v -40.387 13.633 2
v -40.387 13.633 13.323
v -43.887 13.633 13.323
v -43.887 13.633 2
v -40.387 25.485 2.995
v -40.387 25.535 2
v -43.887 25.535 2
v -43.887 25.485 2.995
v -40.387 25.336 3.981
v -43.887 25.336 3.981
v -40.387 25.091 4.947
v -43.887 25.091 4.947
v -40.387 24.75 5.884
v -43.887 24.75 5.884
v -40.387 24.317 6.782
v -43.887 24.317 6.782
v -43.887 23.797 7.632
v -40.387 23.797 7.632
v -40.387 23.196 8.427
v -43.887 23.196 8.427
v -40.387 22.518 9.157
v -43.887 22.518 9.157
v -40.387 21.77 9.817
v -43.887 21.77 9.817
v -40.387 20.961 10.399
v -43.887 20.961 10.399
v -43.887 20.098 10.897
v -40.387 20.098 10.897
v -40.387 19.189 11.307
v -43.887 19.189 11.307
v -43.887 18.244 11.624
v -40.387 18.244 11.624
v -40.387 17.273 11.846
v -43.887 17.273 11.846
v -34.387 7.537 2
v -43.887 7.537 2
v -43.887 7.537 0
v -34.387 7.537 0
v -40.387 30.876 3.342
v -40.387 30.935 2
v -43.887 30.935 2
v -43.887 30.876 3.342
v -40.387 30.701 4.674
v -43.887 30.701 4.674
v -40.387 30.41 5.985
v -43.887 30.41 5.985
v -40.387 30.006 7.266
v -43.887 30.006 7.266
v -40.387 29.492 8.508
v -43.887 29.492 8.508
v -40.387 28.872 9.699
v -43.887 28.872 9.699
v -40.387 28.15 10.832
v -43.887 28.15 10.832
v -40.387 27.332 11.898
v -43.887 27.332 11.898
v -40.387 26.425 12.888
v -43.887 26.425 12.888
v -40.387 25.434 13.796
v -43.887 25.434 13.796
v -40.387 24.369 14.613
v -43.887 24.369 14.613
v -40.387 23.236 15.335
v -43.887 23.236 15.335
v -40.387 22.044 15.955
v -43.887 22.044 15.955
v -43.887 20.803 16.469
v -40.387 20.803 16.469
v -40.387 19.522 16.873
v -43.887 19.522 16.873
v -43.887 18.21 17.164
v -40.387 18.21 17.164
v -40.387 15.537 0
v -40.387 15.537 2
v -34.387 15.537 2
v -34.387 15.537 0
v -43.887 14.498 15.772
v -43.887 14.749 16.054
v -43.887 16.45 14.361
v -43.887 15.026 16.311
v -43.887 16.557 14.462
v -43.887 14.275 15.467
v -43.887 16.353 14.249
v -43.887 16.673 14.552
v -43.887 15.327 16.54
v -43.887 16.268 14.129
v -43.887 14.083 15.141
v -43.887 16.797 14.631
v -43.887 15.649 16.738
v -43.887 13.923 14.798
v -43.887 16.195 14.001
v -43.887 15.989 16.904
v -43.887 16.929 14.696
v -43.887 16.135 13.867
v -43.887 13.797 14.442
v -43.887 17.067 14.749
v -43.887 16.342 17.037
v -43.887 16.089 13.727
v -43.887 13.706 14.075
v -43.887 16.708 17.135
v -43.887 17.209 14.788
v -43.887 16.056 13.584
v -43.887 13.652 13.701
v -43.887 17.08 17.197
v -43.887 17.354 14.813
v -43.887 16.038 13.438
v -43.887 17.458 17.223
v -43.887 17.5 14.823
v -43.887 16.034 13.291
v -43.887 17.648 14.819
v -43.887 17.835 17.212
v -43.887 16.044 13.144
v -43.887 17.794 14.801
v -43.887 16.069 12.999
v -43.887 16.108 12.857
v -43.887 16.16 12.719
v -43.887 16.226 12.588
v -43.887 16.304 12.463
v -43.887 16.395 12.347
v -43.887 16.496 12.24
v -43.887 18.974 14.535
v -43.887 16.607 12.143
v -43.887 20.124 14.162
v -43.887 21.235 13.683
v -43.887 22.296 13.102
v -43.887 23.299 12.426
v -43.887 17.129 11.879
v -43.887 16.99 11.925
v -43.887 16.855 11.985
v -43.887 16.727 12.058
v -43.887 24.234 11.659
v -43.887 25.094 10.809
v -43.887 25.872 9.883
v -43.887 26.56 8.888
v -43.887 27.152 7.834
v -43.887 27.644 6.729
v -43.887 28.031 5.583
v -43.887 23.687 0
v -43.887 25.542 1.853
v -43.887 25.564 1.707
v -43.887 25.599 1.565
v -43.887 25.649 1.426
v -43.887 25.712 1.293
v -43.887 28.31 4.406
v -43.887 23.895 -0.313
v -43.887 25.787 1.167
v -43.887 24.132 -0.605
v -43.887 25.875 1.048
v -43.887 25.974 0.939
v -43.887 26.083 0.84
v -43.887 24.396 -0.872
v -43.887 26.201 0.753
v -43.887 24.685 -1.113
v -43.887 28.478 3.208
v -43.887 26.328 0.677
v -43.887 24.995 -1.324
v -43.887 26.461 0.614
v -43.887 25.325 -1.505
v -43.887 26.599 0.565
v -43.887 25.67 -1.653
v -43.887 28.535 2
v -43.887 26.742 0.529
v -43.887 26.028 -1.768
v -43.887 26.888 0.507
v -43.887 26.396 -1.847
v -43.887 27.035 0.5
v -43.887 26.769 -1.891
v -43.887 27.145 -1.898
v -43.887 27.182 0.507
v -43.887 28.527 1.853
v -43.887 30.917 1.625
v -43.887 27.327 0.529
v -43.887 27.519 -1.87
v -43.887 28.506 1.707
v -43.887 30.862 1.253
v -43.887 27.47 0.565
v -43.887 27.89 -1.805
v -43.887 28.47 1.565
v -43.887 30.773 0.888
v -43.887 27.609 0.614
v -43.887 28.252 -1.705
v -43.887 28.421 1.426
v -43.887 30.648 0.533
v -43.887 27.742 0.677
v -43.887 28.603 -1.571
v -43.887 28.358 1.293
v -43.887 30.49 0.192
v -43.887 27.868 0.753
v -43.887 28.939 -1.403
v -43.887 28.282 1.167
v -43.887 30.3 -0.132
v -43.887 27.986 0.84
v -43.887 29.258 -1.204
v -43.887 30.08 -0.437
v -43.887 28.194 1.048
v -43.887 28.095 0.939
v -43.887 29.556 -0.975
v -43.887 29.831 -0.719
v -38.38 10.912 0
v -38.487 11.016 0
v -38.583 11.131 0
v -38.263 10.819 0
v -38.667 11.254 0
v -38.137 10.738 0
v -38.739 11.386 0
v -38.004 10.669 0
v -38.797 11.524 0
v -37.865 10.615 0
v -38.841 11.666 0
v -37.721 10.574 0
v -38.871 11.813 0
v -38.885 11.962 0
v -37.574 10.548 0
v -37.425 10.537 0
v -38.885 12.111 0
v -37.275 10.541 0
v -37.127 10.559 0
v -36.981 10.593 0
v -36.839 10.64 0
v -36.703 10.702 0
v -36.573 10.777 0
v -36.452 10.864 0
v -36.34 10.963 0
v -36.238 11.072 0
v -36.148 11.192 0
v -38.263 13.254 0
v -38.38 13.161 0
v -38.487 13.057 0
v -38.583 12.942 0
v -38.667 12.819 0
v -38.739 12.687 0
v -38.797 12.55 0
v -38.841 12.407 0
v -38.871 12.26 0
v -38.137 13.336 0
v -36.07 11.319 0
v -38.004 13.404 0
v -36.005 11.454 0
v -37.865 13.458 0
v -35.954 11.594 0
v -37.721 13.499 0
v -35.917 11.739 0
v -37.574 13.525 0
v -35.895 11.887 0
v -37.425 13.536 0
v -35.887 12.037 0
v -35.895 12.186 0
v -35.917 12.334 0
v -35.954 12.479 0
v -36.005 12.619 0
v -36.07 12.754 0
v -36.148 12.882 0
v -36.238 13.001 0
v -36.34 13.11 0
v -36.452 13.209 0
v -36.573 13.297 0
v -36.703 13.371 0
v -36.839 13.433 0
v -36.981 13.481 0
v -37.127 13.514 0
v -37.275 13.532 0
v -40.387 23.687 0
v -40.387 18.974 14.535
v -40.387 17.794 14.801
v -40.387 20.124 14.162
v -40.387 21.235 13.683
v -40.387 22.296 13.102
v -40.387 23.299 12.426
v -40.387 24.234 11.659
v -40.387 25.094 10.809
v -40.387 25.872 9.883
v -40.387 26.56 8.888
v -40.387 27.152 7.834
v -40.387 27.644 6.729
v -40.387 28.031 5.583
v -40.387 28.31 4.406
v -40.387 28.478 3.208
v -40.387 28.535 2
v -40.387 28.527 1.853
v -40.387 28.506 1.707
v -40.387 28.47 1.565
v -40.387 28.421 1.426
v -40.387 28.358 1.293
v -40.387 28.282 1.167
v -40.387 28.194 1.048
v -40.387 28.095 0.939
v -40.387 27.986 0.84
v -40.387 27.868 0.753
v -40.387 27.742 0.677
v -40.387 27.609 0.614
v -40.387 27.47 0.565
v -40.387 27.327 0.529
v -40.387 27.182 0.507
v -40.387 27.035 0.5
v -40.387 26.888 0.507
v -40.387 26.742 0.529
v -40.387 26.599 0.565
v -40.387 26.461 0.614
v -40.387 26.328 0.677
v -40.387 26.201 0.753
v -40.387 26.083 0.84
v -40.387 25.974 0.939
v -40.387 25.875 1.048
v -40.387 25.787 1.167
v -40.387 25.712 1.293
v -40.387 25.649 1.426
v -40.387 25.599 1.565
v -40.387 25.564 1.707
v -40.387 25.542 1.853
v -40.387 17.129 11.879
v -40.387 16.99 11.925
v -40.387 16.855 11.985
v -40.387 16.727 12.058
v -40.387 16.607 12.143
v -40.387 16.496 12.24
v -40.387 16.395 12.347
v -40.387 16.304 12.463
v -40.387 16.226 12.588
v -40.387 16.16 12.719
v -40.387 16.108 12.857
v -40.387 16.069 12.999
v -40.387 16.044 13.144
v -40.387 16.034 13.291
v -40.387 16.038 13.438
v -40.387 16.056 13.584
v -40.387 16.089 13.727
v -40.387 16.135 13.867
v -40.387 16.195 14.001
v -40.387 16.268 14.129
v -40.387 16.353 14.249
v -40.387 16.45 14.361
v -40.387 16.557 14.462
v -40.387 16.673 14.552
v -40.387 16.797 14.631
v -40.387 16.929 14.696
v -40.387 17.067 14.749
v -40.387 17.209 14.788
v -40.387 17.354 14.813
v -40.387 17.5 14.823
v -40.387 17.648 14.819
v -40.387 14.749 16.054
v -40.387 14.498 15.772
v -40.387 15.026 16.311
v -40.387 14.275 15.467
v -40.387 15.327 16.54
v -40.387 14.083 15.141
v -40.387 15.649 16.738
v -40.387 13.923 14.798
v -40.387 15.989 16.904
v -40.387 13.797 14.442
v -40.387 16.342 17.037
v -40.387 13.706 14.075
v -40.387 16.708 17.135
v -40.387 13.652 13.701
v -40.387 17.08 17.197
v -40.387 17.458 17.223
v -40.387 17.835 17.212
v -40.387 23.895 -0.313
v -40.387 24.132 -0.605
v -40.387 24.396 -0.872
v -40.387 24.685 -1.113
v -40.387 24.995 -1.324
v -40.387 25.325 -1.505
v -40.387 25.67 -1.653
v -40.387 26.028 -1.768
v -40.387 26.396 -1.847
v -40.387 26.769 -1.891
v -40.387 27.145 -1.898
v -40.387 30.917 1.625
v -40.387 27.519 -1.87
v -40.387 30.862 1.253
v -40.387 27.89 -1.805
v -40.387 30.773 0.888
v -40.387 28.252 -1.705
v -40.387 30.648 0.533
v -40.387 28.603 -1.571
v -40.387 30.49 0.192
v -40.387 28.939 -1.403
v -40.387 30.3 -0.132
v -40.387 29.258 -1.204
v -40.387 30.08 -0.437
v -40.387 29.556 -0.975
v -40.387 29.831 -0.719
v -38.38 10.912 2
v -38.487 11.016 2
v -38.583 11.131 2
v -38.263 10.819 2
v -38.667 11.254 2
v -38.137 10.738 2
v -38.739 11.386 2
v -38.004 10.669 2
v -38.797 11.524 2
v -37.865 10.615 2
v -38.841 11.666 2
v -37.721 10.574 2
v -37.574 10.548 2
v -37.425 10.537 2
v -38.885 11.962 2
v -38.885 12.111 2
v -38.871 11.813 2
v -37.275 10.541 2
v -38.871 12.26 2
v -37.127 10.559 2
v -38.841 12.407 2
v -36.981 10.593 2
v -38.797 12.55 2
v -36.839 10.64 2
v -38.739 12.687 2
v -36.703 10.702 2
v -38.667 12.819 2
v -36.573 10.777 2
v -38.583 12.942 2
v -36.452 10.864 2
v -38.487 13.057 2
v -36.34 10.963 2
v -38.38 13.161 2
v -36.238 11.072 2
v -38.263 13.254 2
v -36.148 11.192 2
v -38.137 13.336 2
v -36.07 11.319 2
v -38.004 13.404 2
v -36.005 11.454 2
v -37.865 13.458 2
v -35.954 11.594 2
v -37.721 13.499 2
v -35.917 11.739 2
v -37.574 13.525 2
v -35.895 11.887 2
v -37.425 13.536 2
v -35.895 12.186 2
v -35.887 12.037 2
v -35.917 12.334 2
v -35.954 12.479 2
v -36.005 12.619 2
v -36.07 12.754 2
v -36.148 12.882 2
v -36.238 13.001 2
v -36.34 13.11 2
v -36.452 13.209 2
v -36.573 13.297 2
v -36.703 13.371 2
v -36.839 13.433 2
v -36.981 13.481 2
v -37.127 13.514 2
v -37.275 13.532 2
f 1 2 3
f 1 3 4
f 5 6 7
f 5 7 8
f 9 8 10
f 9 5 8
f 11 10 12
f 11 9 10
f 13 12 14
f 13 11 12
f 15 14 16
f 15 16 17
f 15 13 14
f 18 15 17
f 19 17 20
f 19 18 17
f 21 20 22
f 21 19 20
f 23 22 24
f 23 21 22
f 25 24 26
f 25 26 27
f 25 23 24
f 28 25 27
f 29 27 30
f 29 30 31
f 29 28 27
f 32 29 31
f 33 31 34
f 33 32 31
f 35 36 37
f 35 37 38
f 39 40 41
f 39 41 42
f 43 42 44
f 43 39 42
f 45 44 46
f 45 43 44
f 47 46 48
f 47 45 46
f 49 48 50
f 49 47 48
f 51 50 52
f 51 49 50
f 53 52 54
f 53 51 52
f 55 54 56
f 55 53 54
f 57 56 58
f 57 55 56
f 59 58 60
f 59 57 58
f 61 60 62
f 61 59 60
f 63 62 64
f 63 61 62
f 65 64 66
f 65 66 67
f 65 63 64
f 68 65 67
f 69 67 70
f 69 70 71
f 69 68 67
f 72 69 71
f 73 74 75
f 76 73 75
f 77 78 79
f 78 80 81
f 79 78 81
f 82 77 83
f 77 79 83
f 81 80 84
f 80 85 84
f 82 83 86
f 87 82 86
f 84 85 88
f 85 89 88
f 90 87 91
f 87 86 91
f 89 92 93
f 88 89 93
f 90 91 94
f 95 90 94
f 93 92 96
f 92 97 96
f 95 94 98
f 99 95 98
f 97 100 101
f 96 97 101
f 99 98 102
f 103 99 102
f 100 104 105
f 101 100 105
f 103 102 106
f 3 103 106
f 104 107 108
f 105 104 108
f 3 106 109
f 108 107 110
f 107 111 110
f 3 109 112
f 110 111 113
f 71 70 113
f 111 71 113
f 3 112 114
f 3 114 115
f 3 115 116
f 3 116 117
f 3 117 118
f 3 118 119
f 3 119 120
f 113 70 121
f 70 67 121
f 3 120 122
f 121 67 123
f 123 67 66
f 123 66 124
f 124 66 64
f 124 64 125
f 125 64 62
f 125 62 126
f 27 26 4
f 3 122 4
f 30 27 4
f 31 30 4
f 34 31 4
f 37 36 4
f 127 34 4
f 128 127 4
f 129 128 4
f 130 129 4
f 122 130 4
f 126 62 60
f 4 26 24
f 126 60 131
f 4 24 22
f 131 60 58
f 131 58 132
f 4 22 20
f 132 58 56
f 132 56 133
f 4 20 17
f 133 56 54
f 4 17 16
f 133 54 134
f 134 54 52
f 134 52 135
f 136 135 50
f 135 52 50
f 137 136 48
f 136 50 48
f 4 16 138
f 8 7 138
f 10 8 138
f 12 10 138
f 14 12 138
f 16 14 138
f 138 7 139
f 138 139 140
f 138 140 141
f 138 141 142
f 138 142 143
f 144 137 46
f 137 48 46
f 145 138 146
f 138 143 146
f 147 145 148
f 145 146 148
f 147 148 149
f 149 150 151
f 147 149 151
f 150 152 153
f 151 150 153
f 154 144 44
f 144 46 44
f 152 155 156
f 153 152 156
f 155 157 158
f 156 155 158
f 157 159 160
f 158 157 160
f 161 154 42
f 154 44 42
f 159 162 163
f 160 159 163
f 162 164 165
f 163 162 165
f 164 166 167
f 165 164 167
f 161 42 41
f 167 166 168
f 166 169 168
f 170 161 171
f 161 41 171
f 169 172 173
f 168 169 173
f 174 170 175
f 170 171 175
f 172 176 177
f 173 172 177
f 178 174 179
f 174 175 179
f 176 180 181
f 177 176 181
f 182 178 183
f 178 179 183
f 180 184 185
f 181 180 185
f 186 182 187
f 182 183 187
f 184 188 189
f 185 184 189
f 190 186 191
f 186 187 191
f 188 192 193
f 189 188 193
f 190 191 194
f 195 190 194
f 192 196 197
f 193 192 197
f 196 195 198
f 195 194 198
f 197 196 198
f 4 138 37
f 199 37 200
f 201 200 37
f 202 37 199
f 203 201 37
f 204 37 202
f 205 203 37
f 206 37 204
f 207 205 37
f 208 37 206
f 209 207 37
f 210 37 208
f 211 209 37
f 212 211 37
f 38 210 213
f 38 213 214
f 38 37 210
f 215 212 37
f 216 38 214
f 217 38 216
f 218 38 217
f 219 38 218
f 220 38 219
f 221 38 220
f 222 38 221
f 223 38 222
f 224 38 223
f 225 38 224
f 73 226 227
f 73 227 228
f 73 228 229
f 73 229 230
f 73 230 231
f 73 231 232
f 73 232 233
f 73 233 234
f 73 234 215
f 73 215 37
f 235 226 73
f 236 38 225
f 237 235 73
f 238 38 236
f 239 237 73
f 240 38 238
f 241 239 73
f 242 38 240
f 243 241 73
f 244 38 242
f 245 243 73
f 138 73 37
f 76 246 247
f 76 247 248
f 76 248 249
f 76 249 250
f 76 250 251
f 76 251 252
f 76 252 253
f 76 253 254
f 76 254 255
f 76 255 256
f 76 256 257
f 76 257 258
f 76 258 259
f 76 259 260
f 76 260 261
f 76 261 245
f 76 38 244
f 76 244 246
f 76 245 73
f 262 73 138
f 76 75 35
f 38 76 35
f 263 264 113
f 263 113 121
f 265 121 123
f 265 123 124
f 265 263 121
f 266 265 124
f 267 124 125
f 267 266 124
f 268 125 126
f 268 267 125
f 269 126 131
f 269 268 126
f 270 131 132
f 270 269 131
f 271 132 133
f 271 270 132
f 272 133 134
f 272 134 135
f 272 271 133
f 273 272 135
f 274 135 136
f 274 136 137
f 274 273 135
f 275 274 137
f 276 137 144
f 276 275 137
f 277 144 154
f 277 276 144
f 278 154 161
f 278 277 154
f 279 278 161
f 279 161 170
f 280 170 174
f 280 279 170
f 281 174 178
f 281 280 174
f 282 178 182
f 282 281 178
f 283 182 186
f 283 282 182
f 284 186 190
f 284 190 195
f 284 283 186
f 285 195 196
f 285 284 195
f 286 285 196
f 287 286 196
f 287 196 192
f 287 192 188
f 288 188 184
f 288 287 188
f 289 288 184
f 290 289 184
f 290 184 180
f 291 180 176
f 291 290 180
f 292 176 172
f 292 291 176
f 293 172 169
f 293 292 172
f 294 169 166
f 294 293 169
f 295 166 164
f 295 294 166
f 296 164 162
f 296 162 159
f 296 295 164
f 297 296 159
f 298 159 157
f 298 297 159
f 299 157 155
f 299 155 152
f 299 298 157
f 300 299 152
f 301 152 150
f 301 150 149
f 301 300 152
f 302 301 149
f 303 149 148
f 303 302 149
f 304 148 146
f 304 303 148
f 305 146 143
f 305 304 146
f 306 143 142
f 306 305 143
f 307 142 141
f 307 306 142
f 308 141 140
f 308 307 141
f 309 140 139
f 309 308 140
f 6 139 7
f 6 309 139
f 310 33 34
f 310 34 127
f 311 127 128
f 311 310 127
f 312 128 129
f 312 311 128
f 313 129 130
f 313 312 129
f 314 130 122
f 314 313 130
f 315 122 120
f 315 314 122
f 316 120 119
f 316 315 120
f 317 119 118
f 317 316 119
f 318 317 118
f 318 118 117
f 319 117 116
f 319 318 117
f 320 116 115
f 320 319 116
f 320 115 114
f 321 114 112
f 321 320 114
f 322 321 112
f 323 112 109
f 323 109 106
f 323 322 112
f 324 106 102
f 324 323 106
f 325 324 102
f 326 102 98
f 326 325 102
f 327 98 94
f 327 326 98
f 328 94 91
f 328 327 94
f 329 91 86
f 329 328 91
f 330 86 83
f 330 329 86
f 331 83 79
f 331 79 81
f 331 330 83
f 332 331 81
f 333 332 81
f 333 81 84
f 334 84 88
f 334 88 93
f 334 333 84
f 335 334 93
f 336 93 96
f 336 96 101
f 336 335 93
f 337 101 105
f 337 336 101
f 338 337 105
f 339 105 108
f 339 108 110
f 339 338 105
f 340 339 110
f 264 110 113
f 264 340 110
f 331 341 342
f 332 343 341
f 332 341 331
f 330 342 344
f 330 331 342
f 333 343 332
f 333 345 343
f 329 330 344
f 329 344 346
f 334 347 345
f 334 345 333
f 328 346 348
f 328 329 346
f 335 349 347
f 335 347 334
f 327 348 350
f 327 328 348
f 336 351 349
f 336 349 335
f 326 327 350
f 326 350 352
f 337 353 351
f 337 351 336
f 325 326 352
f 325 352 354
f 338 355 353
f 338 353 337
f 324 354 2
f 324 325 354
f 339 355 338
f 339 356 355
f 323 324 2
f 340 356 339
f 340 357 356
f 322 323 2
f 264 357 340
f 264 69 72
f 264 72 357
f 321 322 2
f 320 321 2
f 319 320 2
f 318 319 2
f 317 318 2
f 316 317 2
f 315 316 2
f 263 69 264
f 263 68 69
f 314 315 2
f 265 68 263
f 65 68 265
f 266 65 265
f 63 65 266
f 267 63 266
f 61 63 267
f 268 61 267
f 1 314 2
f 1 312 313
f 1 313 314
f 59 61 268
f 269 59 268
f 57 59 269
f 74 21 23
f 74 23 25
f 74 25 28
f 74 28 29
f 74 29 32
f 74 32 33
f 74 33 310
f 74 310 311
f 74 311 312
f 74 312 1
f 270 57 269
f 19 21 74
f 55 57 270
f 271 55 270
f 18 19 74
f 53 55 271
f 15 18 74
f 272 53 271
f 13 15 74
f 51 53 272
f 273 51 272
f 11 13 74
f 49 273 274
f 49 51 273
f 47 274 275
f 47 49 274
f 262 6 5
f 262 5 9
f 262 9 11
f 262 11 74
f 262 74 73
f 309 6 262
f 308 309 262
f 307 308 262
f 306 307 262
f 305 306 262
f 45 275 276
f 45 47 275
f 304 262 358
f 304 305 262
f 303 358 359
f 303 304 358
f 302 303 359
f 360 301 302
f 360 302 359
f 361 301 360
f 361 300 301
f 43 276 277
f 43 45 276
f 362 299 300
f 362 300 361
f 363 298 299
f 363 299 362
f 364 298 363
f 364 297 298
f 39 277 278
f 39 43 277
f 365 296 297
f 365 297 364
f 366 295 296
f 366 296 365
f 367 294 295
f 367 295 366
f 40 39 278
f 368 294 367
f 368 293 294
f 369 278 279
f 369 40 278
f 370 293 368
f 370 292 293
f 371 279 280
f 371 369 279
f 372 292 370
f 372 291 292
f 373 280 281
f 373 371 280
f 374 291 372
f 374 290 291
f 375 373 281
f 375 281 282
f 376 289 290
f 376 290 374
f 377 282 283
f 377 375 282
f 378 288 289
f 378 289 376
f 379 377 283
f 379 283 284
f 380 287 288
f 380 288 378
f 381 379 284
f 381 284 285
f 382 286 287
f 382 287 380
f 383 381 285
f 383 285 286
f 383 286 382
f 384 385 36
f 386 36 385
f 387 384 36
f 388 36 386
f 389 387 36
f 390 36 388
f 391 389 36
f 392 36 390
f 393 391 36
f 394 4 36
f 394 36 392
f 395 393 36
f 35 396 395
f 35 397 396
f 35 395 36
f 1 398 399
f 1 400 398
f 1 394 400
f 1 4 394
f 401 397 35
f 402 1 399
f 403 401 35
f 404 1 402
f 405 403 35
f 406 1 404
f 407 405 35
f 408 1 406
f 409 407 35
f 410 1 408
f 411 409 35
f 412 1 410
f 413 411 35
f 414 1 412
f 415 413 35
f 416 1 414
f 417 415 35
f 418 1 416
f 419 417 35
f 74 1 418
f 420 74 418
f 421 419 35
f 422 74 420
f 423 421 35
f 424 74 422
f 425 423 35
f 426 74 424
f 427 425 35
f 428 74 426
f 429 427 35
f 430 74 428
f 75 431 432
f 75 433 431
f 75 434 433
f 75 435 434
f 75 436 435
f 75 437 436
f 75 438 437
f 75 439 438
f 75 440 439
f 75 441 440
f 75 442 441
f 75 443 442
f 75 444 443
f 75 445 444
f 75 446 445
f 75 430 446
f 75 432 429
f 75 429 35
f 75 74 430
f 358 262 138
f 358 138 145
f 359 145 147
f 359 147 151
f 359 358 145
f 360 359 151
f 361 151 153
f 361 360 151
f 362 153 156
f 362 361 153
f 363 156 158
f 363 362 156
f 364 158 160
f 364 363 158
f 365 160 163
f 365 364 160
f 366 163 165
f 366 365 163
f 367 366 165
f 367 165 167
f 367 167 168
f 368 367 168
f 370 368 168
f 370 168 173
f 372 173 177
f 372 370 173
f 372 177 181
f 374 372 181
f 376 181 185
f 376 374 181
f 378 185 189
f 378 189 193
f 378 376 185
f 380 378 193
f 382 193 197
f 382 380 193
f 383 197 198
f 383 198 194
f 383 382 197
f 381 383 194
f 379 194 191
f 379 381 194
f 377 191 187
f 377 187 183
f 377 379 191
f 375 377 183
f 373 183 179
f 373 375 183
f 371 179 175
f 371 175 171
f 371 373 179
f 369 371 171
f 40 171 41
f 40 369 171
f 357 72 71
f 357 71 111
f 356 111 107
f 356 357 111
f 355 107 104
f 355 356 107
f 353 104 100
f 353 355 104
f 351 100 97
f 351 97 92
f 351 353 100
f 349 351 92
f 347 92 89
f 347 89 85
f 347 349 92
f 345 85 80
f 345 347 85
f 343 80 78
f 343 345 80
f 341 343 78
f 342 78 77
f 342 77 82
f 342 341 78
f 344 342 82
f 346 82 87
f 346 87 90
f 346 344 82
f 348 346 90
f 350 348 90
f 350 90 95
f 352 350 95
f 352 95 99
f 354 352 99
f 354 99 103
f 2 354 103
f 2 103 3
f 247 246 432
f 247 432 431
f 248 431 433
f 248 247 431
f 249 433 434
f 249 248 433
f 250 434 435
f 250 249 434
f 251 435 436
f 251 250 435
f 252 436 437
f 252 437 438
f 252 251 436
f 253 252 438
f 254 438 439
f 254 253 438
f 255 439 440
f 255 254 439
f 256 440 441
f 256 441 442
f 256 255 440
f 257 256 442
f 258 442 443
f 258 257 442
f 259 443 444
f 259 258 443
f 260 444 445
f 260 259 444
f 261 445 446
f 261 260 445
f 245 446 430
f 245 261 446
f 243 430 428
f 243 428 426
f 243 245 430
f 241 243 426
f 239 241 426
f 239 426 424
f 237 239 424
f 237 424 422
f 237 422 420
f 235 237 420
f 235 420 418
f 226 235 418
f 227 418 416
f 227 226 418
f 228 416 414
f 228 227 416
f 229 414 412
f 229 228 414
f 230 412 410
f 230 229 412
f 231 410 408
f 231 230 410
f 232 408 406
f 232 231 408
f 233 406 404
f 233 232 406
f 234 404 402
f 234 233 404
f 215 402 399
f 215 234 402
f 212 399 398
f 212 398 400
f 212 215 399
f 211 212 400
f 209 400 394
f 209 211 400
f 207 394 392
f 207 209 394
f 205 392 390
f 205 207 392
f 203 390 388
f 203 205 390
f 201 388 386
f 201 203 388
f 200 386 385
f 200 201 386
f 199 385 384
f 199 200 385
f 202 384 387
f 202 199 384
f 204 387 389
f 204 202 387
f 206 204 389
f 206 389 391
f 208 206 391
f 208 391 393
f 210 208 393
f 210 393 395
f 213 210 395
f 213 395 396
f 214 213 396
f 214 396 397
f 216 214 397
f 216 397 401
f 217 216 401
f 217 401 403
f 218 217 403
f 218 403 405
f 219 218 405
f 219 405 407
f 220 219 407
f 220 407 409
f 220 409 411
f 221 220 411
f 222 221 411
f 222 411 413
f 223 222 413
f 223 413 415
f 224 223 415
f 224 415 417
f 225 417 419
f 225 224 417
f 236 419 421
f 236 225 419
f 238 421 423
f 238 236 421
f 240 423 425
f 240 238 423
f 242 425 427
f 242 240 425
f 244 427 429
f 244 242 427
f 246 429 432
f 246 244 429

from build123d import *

# Parameters (mm, degrees)
CROQUIS1_W                   = 26
CROQUIS1_H                   = 28
CROQUIS1_R                   = 1.5
SALIENTE_EXTRUIR1_DEPTH      = 2
CROQUIS7_W                   = 3
CROQUIS7_H                   = 8
SALIENTE_EXTRUIR3_DEPTH      = 2
SALIENTE_EXTRUIR2_DEPTH      = 3
SALIENTE_EXTRUIR2_DEPTH_BACK = 0.5
CORTAR_EXTRUIR1_DEPTH        = 2


with BuildPart() as part:
    # Croquis1 → Saliente-Extruir1 (new body)
    with BuildSketch(Plane.XY):
        with Locations((-27.887270297, 1.536585366)):
            Rectangle(CROQUIS1_W, CROQUIS1_H)
        with Locations((-37.387270297, 12.036585366)):
            Circle(CROQUIS1_R, mode=Mode.SUBTRACT)
        with Locations(Location((-18.387270297, 12.036585366, 0), (0, 0, 180))):
            Circle(CROQUIS1_R, mode=Mode.SUBTRACT)
        with Locations((-27.887270297, -5.463414634)):
            Circle(CROQUIS1_R, mode=Mode.SUBTRACT)
    extrude(amount=SALIENTE_EXTRUIR1_DEPTH)

    # Croquis7 → Saliente-Extruir3 (add)
    with BuildSketch(Plane.XY.offset(2)):
        with Locations((-42.387270297, 11.536585366)):
            Rectangle(CROQUIS7_W, CROQUIS7_H)
    extrude(amount=-SALIENTE_EXTRUIR3_DEPTH)

    # Croquis4 → Saliente-Extruir2 (add, two sides: drawn at the far end of the back side and taken through both)
    with BuildSketch(Plane.ZY.offset(40.887270297).offset(-SALIENTE_EXTRUIR2_DEPTH_BACK)):
        with BuildLine():
            Line((0, 15.536585366), (0, 23.686563701))
            ThreePointArc((0, 23.686563701), (-1.75950275, 28.072068742), (2, 30.934697509))
            ThreePointArc((2, 30.934697509), (11.897715698, 27.332223608), (17.164180221, 18.210439479))
            ThreePointArc((17.164180221, 18.210439479), (16.311003312, 15.026339908), (13.323429984, 13.633211586))
            Line((13.323429984, 13.633211586), (2, 13.633211586))
            Line((2, 13.633211586), (2, 15.536585366))
            Line((2, 15.536585366), (0, 15.536585366))
        make_face()
        with BuildLine():
            ThreePointArc((14.800641614, 17.793683853), (10.355025435, 25.493716944), (2, 28.534697509))
            ThreePointArc((2, 28.534697509), (0.5, 27.034697509), (2, 25.534697509))
            ThreePointArc((2, 25.534697509), (8.426662606, 23.195583615), (11.846218354, 17.27273932))
            ThreePointArc((11.846218354, 17.27273932), (13.583902251, 16.055999957), (14.800641614, 17.793683853))
        make_face(mode=Mode.SUBTRACT)
    extrude(amount=SALIENTE_EXTRUIR2_DEPTH + SALIENTE_EXTRUIR2_DEPTH_BACK)

    # Croquis5 → Cortar-Extruir1 (cut)
    with BuildSketch(Plane.XY.offset(2)):
        Polygon((-34.387270297, 15.536585366), (-34.387270297, 7.536585366), (-40.887270297, 7.536585366), (-40.887270297, -12.463414634), (-14.887270297, -12.463414634), (-14.887270297, 15.536585366), align=None)
    extrude(amount=-CORTAR_EXTRUIR1_DEPTH, mode=Mode.SUBTRACT)


solid = part.part
